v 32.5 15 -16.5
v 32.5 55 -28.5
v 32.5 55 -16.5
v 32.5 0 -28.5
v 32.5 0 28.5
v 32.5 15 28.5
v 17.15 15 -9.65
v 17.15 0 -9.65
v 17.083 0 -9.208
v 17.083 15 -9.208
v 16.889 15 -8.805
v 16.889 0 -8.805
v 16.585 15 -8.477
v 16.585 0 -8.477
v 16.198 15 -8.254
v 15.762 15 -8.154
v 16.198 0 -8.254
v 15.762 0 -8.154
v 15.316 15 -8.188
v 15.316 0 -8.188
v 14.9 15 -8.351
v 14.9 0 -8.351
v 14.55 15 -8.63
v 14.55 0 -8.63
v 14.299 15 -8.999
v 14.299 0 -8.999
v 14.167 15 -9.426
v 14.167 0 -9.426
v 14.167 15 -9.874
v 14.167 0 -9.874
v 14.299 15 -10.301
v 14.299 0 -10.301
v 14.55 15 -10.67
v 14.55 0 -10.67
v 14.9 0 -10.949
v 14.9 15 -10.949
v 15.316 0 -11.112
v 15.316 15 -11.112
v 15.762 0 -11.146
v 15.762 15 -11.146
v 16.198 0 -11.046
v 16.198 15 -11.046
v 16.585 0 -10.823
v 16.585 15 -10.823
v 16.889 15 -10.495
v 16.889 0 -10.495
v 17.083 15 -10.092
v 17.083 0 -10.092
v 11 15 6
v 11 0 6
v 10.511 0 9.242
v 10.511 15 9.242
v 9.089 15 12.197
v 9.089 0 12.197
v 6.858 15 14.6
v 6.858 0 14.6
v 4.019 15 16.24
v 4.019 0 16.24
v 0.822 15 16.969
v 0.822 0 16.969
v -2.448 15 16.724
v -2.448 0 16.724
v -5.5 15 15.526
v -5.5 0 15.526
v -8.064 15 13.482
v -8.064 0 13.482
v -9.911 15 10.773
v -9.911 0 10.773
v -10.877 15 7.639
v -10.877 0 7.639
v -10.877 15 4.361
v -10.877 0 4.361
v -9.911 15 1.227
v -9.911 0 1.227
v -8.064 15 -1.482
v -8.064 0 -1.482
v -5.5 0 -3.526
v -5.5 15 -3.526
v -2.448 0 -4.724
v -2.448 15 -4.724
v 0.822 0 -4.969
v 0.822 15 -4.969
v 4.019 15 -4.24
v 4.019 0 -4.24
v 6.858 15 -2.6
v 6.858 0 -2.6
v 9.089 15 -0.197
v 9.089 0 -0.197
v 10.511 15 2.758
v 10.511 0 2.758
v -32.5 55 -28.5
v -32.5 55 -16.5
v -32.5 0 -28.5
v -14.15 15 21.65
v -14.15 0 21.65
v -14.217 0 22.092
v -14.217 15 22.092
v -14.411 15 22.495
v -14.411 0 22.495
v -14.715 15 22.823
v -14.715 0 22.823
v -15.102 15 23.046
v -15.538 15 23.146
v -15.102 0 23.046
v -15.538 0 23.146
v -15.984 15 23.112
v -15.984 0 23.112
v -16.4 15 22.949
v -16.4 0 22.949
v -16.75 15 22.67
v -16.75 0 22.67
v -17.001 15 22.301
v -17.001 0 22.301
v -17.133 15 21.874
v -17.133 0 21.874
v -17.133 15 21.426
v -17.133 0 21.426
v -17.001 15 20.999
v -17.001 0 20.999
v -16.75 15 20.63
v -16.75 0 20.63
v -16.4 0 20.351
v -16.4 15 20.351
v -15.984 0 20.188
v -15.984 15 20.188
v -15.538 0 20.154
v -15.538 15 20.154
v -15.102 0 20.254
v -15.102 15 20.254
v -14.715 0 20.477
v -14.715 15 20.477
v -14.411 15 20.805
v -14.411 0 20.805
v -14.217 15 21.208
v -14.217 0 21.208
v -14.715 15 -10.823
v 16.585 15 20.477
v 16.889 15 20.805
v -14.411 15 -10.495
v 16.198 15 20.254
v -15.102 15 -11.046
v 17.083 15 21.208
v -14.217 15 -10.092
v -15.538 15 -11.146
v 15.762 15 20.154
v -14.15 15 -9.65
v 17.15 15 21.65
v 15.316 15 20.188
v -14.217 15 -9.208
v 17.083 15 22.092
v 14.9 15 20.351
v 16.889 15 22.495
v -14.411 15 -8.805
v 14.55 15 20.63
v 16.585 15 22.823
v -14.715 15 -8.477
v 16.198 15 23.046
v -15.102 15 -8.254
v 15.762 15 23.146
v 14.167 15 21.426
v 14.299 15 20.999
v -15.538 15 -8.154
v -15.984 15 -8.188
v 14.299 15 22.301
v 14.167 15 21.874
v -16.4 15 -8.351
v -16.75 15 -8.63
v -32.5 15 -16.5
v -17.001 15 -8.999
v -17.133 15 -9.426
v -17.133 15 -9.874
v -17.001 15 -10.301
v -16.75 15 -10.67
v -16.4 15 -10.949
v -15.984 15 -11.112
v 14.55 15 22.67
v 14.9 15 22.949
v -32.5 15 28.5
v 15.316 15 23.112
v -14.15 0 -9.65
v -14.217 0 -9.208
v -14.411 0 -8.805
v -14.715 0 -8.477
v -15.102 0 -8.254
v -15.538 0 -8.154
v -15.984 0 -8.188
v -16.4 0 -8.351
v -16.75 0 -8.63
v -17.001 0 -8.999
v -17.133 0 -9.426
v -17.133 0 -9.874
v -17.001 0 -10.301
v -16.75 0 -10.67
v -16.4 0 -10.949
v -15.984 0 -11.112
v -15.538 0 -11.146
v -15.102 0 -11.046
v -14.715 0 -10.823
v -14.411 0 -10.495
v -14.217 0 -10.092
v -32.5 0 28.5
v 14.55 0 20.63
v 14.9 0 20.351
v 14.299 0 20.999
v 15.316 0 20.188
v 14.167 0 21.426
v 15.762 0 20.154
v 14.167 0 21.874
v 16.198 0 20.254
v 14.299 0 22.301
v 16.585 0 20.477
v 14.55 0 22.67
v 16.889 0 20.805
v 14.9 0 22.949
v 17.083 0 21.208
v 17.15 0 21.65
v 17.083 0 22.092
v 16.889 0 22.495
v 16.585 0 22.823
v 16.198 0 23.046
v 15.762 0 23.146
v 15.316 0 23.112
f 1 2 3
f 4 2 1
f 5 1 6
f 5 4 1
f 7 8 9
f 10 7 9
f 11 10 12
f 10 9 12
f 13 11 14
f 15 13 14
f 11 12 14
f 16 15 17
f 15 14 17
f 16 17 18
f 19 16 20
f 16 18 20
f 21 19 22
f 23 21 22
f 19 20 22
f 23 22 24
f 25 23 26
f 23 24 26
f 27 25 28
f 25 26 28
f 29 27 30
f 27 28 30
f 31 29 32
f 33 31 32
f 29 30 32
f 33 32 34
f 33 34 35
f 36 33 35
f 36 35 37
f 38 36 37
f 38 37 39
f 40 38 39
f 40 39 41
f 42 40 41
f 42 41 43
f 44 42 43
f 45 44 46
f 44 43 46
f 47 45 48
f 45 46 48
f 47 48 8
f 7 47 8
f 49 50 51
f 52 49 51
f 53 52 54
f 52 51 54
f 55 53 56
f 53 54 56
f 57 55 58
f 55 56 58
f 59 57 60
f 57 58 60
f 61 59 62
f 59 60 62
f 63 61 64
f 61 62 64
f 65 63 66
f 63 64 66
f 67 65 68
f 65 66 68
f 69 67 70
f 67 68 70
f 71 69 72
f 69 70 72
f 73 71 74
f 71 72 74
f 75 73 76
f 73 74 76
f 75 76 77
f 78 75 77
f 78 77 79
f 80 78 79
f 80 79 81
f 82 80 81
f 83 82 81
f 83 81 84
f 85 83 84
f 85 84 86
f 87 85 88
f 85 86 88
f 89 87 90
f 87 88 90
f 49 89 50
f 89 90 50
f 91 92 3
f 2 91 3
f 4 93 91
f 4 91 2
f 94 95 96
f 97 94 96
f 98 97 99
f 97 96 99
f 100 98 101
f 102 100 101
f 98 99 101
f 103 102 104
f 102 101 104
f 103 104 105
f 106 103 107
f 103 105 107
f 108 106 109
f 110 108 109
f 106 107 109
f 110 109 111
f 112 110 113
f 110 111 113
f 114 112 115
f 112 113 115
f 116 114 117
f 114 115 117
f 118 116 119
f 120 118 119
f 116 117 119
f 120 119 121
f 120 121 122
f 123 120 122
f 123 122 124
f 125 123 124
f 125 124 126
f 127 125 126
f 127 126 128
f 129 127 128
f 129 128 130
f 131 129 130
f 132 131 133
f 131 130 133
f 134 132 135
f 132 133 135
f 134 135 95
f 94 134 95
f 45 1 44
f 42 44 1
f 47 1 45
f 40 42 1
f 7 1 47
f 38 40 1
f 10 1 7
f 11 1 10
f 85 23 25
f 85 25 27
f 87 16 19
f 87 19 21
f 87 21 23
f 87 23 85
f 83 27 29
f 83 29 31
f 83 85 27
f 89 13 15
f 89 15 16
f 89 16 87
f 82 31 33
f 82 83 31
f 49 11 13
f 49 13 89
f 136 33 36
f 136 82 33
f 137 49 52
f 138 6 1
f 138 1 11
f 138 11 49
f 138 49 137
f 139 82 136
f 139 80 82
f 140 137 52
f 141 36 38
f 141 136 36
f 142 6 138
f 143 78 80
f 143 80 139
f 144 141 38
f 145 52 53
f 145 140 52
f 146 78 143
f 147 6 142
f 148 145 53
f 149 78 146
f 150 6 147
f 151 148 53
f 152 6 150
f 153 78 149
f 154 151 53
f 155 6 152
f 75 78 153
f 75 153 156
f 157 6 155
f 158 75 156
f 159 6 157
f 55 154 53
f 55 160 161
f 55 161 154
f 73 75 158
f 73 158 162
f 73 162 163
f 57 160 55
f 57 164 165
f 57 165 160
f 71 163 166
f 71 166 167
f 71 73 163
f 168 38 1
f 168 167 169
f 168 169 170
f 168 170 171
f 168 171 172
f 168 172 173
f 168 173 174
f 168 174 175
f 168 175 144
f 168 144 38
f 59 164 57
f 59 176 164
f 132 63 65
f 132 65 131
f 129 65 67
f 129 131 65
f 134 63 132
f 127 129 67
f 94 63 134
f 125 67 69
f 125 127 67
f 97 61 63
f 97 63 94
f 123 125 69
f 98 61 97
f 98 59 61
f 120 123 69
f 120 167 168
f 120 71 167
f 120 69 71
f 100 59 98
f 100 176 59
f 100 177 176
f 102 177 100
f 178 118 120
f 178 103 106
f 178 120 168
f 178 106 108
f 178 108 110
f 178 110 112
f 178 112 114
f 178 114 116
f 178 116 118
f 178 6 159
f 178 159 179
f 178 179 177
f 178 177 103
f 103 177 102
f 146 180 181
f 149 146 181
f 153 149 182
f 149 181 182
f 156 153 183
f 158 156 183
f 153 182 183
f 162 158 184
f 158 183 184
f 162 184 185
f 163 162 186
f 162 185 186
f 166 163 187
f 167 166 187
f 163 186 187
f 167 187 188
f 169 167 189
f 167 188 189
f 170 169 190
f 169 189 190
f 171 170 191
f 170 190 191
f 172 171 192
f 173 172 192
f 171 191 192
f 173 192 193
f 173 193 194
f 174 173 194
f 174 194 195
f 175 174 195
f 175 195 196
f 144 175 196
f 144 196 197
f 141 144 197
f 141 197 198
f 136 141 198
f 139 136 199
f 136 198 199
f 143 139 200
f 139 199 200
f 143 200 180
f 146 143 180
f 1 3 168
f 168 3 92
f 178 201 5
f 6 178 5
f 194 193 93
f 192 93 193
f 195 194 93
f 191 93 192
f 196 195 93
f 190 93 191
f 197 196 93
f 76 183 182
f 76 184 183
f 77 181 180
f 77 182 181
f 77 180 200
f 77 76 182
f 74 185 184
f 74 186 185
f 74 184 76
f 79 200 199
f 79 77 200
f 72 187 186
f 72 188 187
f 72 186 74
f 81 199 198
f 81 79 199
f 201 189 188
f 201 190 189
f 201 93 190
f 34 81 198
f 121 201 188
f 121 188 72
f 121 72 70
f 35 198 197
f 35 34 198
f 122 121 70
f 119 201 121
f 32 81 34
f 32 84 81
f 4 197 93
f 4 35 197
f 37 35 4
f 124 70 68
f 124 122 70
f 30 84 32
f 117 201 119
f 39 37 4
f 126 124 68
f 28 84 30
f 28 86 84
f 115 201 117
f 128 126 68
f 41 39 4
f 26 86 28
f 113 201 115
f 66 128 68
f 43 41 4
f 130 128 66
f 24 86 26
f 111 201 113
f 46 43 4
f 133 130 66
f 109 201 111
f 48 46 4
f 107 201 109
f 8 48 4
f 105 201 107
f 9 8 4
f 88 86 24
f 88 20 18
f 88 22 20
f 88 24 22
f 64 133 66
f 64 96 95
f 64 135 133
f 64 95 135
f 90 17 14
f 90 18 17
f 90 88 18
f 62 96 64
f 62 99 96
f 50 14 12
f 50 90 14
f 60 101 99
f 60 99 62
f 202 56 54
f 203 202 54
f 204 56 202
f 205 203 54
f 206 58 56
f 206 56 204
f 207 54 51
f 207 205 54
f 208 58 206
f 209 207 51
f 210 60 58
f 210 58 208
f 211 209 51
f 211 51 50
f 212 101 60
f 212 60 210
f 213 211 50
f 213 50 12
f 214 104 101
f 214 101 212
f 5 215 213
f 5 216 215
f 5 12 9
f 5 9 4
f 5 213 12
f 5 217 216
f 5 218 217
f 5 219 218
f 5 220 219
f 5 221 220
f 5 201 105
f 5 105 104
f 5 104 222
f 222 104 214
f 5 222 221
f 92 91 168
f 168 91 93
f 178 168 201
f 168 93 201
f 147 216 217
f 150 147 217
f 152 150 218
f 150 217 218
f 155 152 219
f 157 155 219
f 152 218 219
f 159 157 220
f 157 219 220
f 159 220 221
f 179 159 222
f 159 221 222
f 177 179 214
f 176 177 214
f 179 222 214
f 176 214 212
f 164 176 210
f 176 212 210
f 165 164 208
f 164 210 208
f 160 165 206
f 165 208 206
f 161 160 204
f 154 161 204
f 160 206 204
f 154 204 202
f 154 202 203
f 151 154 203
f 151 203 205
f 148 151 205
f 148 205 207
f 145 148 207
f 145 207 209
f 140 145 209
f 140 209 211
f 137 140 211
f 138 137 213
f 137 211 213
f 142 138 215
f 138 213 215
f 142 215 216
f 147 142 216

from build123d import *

# Parameters (mm, degrees)
F0_W      = 65
F0_H      = 57
F1_DEPTH  = 55
F2_W      = 65
F2_H      = 45
F3_DEPTH  = 40
F4_R      = 11
F5_DEPTH  = 15
F6_R      = 1.5
F10_DEPTH = 15
F7_R      = 1.5
F11_DEPTH = 15
F8_R      = 1.5
F12_DEPTH = 15
F9_R      = 1.5
F13_DEPTH = 15


with BuildPart() as f1:
    # F0 (on Front) → F1 (new body)
    with BuildSketch(Plane.XZ):
        Rectangle(F0_W, F0_H)
    extrude(amount=-F1_DEPTH)

    # F2 (on face) → F3 (cut)
    with BuildSketch(Plane(origin=(0, 55, 0), x_dir=(-1, 0, 0), z_dir=(0, 1, 0))):
        with Locations((0, 6)):
            Rectangle(F2_W, F2_H)
    extrude(amount=-F3_DEPTH, mode=Mode.SUBTRACT)

    # F4 (on face) → F5 (cut)
    with BuildSketch(Plane.XZ):
        with Locations((0, 6)):
            Circle(F4_R)
    extrude(amount=-F5_DEPTH, mode=Mode.SUBTRACT)

    # F6 (on face) → F10 (cut)
    with BuildSketch(Plane.XZ):
        with Locations((15.65, 21.65)):
            Circle(F6_R)
    extrude(amount=-F10_DEPTH, mode=Mode.SUBTRACT)

    # F7 (on face) → F11 (cut)
    with BuildSketch(Plane.XZ):
        with Locations((-15.65, 21.65)):
            Circle(F7_R)
    extrude(amount=-F11_DEPTH, mode=Mode.SUBTRACT)

    # F8 (on face) → F12 (cut)
    with BuildSketch(Plane.XZ):
        with Locations((15.65, -9.65)):
            Circle(F8_R)
    extrude(amount=-F12_DEPTH, mode=Mode.SUBTRACT)

    # F9 (on face) → F13 (cut)
    with BuildSketch(Plane.XZ):
        with Locations((-15.65, -9.65)):
            Circle(F9_R)
    extrude(amount=-F13_DEPTH, mode=Mode.SUBTRACT)


solid = f1.part
